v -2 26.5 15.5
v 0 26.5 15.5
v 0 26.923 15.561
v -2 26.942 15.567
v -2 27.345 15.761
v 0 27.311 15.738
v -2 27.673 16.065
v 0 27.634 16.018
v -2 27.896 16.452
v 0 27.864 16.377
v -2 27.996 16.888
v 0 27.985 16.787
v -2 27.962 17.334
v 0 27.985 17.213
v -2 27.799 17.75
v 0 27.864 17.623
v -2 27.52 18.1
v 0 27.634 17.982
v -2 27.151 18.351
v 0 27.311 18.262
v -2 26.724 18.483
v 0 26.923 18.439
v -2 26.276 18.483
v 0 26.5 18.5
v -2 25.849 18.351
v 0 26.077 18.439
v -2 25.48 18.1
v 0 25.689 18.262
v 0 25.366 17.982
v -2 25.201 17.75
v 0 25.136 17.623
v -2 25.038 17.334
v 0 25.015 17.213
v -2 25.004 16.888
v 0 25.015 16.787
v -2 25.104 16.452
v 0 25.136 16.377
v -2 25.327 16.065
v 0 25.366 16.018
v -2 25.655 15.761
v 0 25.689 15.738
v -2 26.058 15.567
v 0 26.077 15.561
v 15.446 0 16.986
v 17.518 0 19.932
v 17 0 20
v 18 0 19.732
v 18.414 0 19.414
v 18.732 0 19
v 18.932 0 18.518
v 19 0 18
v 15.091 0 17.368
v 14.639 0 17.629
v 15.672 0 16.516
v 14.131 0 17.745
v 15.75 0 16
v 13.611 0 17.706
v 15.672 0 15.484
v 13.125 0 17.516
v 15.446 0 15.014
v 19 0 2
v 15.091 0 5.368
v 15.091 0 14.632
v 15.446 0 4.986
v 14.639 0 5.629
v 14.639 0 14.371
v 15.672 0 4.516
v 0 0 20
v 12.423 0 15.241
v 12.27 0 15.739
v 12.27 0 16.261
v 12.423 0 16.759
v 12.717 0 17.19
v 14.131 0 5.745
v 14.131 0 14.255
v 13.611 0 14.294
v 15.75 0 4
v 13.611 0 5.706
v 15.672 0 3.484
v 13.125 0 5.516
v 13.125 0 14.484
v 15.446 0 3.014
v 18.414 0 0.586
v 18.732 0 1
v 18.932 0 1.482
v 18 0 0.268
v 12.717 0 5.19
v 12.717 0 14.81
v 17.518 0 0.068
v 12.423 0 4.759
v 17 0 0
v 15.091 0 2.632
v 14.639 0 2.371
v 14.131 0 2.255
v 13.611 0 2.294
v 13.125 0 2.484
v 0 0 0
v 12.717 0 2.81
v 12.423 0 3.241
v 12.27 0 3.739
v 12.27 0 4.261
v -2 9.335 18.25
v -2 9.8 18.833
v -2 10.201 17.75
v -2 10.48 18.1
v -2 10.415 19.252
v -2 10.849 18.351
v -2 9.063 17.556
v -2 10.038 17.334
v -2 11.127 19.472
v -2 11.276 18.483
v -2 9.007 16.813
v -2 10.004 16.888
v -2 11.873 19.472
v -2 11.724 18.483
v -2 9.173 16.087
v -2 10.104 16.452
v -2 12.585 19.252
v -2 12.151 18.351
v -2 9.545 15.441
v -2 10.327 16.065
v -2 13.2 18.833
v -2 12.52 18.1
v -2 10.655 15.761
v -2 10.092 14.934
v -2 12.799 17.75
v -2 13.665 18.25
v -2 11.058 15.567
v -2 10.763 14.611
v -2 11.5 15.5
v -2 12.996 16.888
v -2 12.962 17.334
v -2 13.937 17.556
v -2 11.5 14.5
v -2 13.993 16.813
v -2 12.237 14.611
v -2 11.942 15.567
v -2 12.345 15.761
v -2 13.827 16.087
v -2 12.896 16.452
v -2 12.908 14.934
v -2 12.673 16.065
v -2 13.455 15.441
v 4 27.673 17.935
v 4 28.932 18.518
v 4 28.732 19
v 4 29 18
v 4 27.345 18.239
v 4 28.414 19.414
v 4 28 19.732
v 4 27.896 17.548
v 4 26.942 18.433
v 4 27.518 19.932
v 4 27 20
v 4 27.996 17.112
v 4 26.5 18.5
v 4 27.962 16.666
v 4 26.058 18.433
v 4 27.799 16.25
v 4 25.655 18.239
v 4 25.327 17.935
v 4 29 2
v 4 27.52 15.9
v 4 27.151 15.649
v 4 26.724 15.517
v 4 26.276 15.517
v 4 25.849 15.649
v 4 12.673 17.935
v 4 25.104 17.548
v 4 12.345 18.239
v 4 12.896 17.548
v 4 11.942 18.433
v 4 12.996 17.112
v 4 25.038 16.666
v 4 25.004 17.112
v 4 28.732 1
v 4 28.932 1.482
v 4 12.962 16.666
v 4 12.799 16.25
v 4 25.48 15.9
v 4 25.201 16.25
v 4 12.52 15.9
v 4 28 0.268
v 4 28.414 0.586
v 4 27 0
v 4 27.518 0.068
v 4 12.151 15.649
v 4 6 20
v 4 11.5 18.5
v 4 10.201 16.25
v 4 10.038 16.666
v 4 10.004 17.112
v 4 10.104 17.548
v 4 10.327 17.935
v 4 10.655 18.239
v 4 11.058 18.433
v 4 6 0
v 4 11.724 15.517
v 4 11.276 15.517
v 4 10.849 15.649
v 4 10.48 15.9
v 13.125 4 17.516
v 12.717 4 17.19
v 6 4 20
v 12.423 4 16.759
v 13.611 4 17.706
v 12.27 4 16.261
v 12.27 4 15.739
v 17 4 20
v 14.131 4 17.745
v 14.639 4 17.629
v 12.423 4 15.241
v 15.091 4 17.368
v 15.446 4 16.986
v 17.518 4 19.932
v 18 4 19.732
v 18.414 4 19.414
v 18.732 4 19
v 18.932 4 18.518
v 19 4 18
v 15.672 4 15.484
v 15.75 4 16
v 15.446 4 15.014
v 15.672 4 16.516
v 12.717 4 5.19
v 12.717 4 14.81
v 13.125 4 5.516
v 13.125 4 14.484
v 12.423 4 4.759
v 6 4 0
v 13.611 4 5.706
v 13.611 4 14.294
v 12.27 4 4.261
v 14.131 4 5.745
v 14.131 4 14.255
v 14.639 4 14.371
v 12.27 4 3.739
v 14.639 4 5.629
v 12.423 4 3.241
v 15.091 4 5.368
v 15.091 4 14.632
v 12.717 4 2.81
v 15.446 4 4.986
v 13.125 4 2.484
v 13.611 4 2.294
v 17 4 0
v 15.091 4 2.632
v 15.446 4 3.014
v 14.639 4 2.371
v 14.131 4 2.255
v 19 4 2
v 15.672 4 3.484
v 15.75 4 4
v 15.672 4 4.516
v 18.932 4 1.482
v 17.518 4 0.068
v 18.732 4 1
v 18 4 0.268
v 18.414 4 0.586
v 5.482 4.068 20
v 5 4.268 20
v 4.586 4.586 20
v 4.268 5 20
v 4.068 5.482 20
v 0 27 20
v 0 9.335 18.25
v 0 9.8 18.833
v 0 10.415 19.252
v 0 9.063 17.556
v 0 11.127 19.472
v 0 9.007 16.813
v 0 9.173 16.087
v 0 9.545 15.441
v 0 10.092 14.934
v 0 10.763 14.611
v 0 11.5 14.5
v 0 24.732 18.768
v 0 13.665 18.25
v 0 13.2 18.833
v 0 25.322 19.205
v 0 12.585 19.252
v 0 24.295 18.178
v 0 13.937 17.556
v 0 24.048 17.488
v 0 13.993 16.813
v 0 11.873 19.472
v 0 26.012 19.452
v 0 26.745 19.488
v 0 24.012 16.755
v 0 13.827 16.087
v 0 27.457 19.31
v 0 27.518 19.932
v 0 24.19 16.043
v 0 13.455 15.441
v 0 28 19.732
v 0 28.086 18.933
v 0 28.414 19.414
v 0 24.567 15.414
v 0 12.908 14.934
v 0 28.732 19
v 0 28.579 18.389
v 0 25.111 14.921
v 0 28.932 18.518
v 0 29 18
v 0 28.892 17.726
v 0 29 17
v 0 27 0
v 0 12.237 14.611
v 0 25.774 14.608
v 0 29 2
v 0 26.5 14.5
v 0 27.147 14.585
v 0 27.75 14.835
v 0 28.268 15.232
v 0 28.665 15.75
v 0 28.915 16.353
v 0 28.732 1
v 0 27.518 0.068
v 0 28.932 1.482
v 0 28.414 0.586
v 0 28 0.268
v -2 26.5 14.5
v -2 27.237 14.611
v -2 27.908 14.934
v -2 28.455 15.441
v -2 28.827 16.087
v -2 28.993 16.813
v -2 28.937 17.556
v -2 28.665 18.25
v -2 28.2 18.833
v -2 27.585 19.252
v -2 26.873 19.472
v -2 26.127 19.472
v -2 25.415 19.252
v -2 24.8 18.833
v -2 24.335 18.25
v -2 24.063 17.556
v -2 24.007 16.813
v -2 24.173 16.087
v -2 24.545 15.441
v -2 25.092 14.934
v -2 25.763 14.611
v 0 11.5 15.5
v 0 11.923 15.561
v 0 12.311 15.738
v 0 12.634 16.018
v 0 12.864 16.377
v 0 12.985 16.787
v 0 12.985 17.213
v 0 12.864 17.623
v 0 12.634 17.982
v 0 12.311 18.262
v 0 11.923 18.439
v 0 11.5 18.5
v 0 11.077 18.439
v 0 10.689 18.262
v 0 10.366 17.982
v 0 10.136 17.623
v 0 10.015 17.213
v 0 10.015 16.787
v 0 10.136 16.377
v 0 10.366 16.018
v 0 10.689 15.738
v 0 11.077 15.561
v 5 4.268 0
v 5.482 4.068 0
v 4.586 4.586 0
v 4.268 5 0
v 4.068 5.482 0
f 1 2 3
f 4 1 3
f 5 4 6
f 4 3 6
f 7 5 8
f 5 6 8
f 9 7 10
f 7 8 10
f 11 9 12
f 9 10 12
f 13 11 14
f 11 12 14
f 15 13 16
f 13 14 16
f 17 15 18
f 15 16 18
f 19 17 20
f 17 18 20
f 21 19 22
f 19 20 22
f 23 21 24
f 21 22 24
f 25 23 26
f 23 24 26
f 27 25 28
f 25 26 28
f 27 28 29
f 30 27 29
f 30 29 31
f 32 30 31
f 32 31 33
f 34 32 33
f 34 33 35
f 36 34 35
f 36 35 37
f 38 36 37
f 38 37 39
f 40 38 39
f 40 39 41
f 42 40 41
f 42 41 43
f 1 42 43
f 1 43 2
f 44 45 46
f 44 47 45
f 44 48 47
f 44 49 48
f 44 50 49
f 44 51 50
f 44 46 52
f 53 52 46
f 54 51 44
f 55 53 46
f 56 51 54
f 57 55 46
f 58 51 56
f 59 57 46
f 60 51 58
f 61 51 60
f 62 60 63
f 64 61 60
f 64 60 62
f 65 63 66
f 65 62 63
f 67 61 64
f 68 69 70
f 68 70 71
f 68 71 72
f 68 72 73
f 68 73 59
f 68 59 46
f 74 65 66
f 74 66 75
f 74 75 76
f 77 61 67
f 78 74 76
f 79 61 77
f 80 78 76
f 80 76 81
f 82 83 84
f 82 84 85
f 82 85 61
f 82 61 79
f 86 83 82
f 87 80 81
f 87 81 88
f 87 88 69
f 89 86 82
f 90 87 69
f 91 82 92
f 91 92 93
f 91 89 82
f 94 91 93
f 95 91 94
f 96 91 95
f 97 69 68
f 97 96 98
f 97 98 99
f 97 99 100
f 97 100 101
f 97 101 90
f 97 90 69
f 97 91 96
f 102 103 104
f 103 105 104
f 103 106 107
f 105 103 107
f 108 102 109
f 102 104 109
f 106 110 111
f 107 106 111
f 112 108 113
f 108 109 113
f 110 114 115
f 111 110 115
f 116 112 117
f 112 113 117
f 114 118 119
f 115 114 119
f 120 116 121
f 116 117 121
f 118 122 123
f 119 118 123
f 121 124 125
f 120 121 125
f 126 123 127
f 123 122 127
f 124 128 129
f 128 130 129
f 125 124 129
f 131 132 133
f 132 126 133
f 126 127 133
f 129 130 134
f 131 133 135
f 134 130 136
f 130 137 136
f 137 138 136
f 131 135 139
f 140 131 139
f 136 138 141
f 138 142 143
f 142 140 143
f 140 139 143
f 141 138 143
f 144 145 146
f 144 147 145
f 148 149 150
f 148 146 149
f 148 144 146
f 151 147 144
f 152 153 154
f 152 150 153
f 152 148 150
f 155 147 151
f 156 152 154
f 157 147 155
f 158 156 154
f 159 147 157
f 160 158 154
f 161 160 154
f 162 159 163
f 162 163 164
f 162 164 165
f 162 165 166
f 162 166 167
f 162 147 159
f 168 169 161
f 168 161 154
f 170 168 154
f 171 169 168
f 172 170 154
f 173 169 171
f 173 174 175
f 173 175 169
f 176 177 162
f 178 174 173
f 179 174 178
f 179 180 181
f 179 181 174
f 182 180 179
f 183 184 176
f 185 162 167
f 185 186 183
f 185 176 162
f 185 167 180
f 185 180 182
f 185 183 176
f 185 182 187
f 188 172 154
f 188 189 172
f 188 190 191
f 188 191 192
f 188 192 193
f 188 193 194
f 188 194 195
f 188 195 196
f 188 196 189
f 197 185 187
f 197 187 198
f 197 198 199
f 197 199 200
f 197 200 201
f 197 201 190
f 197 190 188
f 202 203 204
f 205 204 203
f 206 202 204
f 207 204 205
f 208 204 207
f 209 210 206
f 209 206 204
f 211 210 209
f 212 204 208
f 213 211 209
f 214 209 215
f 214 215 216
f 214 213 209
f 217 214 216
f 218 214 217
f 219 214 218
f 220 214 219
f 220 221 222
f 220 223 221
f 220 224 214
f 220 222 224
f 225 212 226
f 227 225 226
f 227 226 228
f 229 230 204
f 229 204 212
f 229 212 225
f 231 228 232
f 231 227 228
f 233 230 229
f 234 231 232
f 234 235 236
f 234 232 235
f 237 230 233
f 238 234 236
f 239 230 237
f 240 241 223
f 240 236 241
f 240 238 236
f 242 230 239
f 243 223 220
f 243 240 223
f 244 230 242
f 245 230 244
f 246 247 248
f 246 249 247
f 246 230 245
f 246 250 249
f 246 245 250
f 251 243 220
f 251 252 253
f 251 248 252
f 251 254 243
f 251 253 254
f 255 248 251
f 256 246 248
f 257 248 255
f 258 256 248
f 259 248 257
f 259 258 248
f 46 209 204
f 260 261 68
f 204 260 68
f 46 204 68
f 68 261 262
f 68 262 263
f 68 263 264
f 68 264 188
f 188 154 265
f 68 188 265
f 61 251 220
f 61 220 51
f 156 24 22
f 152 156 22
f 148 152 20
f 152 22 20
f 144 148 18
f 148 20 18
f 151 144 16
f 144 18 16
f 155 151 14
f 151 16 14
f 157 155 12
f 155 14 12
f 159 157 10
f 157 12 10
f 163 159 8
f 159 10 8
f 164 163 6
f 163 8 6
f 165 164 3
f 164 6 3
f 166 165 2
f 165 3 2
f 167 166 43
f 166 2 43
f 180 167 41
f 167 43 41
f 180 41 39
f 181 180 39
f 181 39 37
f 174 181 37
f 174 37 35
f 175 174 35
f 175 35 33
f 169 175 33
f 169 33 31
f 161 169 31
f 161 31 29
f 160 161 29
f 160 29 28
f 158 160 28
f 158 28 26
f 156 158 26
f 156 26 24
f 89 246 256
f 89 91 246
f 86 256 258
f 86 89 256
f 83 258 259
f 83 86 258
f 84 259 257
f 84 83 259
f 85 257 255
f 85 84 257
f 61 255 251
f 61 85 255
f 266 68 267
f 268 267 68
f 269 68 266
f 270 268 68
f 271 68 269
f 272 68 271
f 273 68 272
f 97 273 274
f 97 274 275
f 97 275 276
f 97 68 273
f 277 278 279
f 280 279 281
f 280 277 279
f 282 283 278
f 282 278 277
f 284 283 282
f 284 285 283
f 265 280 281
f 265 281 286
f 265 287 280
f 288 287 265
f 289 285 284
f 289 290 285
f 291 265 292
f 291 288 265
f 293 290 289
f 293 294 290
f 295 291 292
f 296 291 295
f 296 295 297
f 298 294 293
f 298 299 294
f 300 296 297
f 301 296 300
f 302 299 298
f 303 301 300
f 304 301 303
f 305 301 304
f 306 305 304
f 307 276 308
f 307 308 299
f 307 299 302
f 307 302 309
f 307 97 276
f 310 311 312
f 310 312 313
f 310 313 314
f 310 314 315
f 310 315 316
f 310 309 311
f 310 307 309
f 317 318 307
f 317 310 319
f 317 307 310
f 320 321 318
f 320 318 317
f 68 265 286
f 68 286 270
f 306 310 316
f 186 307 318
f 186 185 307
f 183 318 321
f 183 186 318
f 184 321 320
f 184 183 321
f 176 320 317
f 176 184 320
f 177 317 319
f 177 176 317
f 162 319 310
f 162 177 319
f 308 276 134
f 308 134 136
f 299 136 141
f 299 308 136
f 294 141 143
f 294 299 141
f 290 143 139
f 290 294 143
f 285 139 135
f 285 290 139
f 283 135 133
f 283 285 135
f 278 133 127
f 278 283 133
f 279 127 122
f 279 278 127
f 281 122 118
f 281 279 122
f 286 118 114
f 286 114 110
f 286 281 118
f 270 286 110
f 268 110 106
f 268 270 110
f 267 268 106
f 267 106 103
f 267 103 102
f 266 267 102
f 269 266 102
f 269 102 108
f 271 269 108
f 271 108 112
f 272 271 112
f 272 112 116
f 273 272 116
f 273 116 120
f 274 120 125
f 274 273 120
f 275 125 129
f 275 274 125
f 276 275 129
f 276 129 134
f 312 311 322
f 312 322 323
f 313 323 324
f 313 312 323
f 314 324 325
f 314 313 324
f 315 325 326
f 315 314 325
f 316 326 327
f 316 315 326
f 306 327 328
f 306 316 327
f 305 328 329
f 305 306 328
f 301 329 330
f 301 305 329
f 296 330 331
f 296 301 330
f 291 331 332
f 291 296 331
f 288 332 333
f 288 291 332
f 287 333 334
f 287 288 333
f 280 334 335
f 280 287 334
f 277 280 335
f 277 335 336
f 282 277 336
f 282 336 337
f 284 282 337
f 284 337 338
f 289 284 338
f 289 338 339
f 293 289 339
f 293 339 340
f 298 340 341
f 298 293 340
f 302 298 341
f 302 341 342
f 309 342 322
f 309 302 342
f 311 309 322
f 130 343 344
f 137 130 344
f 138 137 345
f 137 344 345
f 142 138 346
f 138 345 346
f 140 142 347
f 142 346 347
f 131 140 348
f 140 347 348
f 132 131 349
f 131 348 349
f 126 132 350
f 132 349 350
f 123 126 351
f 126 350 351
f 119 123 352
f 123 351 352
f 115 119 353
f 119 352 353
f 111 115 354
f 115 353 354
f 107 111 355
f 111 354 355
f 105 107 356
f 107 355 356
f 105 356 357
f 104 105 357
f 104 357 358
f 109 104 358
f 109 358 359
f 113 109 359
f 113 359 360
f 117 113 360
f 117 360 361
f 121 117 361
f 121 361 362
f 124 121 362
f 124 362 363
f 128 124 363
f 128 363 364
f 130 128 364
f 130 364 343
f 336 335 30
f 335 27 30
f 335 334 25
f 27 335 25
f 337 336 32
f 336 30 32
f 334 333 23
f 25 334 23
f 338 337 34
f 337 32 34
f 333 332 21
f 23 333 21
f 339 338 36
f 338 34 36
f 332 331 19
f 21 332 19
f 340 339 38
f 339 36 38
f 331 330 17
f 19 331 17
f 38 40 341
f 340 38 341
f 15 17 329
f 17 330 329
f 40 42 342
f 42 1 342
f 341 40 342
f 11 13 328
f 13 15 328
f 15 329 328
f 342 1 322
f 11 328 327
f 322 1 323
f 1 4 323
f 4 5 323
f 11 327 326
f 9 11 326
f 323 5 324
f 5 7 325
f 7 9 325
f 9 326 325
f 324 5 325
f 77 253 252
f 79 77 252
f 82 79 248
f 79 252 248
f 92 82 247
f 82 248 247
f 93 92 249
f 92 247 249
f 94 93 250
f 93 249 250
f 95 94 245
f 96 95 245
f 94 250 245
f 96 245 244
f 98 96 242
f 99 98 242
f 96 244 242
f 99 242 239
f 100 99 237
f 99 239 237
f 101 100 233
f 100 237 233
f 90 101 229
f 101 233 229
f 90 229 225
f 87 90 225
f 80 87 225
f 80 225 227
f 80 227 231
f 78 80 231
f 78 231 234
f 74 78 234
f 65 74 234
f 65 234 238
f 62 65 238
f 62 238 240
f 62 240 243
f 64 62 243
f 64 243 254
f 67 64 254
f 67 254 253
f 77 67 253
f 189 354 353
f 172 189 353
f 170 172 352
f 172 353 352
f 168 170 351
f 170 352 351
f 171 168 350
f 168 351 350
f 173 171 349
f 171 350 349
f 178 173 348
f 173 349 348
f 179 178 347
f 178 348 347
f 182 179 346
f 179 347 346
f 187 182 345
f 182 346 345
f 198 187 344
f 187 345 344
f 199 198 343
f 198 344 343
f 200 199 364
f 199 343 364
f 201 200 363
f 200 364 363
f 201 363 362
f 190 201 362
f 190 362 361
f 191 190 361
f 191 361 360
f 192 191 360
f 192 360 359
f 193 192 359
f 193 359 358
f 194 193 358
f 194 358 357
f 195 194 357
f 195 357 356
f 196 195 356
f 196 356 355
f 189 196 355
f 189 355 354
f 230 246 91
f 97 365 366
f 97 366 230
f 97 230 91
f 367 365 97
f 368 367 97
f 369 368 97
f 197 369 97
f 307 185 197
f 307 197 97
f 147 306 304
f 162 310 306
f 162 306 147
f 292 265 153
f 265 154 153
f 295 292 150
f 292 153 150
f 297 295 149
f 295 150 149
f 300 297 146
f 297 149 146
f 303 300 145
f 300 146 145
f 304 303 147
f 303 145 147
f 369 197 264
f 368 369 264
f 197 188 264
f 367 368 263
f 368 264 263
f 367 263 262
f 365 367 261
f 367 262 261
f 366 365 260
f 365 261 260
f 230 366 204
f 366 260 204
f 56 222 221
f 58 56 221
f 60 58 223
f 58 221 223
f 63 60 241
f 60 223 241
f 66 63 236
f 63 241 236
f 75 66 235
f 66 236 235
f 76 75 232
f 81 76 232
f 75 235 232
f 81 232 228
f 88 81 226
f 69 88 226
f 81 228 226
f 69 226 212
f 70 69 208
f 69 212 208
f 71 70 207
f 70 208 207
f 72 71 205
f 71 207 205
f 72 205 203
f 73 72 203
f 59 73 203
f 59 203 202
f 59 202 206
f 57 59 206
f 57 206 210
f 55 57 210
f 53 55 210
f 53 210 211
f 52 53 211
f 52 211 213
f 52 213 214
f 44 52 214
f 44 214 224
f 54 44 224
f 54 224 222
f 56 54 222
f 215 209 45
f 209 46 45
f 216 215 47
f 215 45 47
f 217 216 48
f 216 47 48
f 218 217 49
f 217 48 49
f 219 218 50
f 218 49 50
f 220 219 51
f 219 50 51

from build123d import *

# Parameters (mm, degrees)
BOSS_EXTRUDE1_DEPTH = 20
SKETCH2_R           = 1.5
CUT_EXTRUDE1_DEPTH  = 20
SKETCH3_R           = 1.75
CUT_EXTRUDE2_DEPTH  = 5
FILLET1_R           = 2
BOSS_EXTRUDE2_START = -4
SKETCH4_R           = 2.5
SKETCH4_R_2         = 1.5
BOSS_EXTRUDE2_DEPTH = 2


with BuildPart() as part:
    # Sketch1 → Boss-Extrude1 (new body)
    with BuildSketch(Plane.XY):
        Polygon((0, 0), (0, 29), (4, 29), (4, 4), (19, 4), (19, 0), align=None)
    extrude(amount=BOSS_EXTRUDE1_DEPTH)

    # Sketch2 → Cut-Extrude1 (cut, through all)
    with BuildSketch(Plane.ZY):
        with Locations((17, 26.5)):
            Circle(SKETCH2_R)
        with Locations((17, 11.5)):
            Circle(SKETCH2_R)
    extrude(amount=-CUT_EXTRUDE1_DEPTH, mode=Mode.SUBTRACT)

    # Sketch3 → Cut-Extrude2 (cut, through all)
    with BuildSketch(Plane(origin=(0, 4, 0), x_dir=(1, 0, 0), z_dir=(0, 1, 0))):
        with Locations((14, -4)):
            Circle(SKETCH3_R)
        with Locations((14, -16)):
            Circle(SKETCH3_R)
    extrude(amount=-CUT_EXTRUDE2_DEPTH, mode=Mode.SUBTRACT)

    # Fillet1
    fillet1_edges = [part.edges().sort_by_distance(p)[0] for p in [
        (4, 4, 10),
        (2, 29, 20),
        (2, 29, 0),
        (19, 2, 0),
        (19, 2, 20),
    ]]
    fillet(fillet1_edges, radius=FILLET1_R)

    # Sketch4 → Boss-Extrude2 (add)
    with BuildSketch(Plane(origin=(4, 0, 0), x_dir=(0, 0, -1), z_dir=(1, 0, 0)).offset(BOSS_EXTRUDE2_START)):
        with Locations((-17, 26.5)):
            Circle(SKETCH4_R)
        with Locations((-17, 26.5)):
            Circle(SKETCH4_R_2, mode=Mode.SUBTRACT)
        with Locations((-17, 11.5)):
            Circle(SKETCH4_R)
        with Locations((-17, 11.5)):
            Circle(SKETCH4_R_2, mode=Mode.SUBTRACT)
    extrude(amount=-BOSS_EXTRUDE2_DEPTH)


solid = part.part
